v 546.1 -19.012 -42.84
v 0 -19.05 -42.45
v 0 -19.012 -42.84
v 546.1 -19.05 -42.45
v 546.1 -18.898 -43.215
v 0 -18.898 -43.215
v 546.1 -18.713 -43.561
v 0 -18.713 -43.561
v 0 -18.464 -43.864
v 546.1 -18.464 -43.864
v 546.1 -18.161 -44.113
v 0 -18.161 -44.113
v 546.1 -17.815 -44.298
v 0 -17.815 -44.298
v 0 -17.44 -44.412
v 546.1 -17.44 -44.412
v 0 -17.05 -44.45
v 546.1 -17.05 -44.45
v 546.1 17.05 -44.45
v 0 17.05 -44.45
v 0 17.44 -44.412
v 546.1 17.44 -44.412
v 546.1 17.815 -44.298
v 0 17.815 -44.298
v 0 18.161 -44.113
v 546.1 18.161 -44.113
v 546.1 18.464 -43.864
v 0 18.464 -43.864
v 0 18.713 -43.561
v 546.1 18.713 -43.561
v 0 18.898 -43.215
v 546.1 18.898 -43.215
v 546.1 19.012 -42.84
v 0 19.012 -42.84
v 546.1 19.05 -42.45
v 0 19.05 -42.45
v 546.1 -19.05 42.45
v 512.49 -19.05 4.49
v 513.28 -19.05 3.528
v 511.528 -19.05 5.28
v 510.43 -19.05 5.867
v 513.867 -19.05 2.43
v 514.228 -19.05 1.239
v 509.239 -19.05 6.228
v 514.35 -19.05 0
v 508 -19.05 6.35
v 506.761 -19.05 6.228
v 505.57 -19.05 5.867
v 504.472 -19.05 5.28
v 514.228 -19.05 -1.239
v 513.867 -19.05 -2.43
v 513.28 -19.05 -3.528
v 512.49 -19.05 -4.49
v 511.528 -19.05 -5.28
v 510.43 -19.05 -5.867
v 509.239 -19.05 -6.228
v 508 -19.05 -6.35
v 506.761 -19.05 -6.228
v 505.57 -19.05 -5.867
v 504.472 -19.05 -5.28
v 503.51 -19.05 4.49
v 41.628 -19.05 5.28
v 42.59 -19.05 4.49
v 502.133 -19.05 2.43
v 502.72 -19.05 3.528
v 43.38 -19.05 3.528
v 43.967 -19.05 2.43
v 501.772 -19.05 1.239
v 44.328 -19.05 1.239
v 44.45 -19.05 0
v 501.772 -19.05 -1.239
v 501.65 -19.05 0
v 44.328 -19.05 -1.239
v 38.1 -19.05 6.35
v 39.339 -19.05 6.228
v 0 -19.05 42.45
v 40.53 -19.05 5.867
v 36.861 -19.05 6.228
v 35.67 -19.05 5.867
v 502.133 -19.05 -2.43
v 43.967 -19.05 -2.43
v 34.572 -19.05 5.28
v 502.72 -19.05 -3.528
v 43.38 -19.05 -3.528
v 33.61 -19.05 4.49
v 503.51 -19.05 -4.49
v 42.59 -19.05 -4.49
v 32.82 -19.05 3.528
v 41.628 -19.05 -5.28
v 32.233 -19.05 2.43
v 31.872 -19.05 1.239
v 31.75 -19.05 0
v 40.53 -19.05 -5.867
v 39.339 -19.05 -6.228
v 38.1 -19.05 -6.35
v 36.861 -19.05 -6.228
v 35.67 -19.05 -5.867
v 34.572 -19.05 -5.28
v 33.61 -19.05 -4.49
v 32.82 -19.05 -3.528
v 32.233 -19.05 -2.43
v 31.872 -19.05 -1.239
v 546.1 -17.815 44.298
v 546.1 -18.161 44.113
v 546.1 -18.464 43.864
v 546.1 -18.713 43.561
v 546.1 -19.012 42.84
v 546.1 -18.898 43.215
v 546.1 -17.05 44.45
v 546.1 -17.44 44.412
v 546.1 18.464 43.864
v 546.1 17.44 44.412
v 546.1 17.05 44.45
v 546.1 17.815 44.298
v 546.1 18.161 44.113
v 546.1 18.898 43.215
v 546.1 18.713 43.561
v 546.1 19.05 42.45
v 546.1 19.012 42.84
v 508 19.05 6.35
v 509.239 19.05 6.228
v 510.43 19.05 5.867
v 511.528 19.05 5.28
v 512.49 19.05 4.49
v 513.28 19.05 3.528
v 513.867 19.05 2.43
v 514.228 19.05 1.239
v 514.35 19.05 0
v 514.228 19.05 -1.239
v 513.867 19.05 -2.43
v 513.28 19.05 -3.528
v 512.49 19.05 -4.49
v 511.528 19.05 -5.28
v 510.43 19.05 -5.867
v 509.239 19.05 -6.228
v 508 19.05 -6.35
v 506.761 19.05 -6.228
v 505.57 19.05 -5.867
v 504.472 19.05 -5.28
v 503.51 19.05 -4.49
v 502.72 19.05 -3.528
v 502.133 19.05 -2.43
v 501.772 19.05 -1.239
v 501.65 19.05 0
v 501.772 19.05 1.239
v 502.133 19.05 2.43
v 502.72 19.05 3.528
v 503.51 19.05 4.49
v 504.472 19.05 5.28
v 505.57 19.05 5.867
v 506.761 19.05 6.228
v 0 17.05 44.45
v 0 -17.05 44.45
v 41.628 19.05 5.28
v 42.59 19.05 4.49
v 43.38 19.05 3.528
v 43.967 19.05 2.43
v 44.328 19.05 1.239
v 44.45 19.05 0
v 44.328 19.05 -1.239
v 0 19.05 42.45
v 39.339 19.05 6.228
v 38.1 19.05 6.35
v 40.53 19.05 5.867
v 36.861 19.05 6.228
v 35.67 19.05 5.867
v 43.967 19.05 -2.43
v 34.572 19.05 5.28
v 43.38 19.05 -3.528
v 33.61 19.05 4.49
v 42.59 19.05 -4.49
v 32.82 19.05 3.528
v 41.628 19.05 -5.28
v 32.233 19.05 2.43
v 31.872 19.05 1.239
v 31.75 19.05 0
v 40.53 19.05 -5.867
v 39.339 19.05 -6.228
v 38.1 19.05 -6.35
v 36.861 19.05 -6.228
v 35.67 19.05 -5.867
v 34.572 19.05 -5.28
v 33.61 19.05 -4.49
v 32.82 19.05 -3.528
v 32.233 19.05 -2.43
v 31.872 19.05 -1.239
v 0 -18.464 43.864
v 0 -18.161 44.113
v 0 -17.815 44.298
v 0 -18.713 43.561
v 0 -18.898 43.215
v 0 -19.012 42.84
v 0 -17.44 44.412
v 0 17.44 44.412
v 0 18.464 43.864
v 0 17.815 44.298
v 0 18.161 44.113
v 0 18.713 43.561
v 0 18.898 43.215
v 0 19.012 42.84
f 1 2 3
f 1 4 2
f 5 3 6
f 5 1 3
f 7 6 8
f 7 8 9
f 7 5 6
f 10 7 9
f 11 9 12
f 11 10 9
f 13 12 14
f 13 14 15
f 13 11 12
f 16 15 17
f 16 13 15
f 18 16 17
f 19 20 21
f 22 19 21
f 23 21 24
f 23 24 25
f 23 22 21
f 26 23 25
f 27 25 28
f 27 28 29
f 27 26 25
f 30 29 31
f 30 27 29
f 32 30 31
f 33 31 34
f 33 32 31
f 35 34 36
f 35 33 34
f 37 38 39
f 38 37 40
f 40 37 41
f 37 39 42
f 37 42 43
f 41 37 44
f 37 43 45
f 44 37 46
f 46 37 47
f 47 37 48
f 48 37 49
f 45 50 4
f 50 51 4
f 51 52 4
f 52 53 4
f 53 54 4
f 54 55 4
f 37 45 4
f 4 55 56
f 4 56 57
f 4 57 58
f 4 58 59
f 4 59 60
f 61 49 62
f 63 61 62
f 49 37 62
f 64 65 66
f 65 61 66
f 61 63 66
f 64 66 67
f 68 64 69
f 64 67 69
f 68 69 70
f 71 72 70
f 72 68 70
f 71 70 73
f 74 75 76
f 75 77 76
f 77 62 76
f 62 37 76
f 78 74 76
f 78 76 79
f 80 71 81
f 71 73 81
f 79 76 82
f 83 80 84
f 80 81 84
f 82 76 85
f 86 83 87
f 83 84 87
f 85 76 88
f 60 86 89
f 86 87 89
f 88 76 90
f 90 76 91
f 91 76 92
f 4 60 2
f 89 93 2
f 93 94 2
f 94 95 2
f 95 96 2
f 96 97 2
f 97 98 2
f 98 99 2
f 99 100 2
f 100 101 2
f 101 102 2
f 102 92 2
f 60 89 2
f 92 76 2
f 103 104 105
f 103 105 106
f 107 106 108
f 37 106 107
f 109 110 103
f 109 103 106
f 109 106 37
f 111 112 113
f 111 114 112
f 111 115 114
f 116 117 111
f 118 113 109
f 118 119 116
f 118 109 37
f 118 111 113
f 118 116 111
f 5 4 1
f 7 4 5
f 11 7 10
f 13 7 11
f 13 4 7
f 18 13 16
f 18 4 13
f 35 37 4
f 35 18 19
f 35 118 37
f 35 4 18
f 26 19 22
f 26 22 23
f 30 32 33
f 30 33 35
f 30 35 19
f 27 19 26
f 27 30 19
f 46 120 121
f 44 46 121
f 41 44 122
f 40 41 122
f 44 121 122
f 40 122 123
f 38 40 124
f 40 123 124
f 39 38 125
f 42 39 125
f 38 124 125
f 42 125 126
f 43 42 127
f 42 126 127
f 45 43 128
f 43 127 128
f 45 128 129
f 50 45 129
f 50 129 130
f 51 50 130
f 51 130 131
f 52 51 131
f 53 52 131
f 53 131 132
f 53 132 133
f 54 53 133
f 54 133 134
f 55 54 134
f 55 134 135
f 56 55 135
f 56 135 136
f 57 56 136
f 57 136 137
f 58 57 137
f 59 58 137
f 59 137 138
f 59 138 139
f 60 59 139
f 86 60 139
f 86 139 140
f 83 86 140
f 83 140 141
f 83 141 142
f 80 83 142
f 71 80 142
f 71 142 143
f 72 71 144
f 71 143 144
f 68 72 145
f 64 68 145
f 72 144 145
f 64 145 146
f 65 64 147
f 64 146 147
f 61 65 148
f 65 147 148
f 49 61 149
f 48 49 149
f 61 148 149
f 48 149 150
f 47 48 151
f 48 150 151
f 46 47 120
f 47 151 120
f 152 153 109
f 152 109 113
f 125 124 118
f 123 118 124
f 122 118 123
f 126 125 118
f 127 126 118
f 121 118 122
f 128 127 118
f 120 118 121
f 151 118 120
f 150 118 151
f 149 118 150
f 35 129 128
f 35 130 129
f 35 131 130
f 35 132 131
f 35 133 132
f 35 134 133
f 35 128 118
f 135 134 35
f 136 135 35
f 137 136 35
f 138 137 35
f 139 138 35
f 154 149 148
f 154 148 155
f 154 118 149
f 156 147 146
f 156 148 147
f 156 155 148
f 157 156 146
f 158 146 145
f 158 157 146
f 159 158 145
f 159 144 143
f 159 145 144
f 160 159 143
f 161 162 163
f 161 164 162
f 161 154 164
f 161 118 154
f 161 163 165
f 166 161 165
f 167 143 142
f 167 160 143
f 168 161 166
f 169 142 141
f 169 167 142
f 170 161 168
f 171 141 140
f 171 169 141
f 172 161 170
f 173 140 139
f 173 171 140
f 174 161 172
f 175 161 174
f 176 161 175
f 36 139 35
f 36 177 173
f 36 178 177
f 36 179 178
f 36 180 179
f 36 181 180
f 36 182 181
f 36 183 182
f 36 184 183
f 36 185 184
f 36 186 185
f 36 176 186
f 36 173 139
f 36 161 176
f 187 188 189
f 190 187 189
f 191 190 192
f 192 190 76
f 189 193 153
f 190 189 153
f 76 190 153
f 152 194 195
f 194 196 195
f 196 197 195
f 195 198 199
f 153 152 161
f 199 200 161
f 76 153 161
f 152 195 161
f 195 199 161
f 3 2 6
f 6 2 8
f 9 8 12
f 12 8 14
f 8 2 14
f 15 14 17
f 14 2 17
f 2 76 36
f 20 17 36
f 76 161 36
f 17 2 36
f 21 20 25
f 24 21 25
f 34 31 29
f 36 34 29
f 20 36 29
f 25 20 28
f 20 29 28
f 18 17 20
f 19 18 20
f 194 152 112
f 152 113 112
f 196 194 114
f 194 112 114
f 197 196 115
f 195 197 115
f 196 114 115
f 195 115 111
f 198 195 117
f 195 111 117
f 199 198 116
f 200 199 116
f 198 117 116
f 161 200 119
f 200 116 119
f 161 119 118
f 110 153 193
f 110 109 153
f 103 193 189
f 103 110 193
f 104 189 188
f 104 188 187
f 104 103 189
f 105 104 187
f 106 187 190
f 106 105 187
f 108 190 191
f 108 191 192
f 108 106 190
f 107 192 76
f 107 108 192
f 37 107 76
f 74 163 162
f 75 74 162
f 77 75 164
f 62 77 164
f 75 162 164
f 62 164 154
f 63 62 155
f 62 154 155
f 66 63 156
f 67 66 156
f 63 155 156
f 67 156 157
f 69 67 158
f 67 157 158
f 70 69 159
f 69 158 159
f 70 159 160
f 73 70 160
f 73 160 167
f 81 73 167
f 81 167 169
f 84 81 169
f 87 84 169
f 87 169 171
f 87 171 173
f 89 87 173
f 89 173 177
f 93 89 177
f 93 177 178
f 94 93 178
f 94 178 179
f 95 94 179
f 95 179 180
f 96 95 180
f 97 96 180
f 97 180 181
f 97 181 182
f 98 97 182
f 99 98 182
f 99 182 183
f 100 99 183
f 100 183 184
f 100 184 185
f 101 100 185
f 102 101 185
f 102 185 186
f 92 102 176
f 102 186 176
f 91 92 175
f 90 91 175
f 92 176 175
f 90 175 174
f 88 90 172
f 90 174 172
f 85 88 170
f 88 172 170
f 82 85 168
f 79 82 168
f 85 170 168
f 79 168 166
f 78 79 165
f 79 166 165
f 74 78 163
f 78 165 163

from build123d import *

# Parameters (mm, degrees)
SKETCH1_W           = 88.9
SKETCH1_H           = 38.1
BOSS_EXTRUDE1_DEPTH = 546.1
FILLET1_R           = 2
SKETCH2_R           = 6.35
CUT_EXTRUDE1_DEPTH  = 550.229116581


with BuildPart() as part:
    # Sketch1 → Boss-Extrude1 (new body)
    with BuildSketch(Plane(origin=(0, 0, 0), x_dir=(0, 0, -1), z_dir=(1, 0, 0))):
        Rectangle(SKETCH1_W, SKETCH1_H)
    extrude(amount=BOSS_EXTRUDE1_DEPTH)

    # Fillet1
    fillet1_edges = [part.edges().sort_by_distance(p)[0] for p in [
        (273.05, -19.05, -44.45),
        (273.05, -19.05, 44.45),
        (273.05, 19.05, 44.45),
        (273.05, 19.05, -44.45),
    ]]
    fillet(fillet1_edges, radius=FILLET1_R)

    # Sketch2 → Cut-Extrude1 (cut, through all)
    with BuildSketch(Plane(origin=(0, 19.05, 0), x_dir=(1, 0, 0), z_dir=(0, 1, 0))):
        with Locations(Location((38.1, 0, 0), (0, 0, 270))):
            Circle(SKETCH2_R)
        with Locations(Location((508, 0, 0), (0, 0, 270))):
            Circle(SKETCH2_R)
    extrude(amount=-CUT_EXTRUDE1_DEPTH, mode=Mode.SUBTRACT)


solid = part.part
